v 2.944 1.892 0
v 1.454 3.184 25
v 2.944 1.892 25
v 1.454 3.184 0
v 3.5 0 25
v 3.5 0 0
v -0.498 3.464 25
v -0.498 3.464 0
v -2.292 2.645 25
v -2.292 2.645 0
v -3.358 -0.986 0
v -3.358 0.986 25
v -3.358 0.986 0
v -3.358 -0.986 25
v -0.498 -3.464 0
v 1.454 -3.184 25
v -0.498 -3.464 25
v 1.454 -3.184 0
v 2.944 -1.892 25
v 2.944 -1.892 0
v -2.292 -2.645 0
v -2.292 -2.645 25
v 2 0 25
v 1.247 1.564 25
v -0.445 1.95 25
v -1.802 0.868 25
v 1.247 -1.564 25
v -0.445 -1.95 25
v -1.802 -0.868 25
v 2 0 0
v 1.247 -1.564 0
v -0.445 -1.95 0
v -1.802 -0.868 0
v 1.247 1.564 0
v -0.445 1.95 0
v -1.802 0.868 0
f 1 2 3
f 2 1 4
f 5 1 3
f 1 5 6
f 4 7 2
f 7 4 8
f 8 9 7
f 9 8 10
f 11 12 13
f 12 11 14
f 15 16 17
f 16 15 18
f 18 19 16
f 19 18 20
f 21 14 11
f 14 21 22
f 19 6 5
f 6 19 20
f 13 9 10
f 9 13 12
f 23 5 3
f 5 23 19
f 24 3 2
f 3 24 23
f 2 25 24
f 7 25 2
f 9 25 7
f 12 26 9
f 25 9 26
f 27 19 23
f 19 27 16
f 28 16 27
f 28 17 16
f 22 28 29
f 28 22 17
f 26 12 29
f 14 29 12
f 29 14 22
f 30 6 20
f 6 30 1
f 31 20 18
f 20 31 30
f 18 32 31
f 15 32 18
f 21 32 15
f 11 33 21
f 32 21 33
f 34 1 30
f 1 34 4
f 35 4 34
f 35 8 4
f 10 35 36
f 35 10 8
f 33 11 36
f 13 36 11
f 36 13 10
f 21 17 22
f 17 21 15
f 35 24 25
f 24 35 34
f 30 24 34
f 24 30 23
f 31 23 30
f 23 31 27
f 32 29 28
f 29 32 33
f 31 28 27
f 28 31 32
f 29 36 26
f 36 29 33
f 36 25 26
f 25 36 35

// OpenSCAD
// file: config.scad
e = 0.01;

// Real Sterilite Tote Size
//toteHeight = 125;
//toteTopWidth = 200;
//toteBottomWidth = 155;
//toteTopLength = 355;
//toteBottomLength = 300;

// Scaled Size
toteHeight = 30;
toteTopWidth = 60;
toteBottomWidth = 45;
toteTopLength = 105;
toteBottomLength = 90;

// Parameters
fingerHeight = 5;
fingerClearance = 5;

armatureHeight = 10;
armatureThickness = 20;

baseHeight = 20;
baseThickness = 10;

boltDiameter = 3;
pinDiameter = 4;

base2Height = 20;

totesPerRow = 3;
// main file
include <config.scad>;

module armSpacer() {
  difference() {
    cylinder(d = 7, h = 25);
    translate([0, 0, -e/2])
      cylinder(d = 4, h = 25 + e);
  }
}

armSpacer();
